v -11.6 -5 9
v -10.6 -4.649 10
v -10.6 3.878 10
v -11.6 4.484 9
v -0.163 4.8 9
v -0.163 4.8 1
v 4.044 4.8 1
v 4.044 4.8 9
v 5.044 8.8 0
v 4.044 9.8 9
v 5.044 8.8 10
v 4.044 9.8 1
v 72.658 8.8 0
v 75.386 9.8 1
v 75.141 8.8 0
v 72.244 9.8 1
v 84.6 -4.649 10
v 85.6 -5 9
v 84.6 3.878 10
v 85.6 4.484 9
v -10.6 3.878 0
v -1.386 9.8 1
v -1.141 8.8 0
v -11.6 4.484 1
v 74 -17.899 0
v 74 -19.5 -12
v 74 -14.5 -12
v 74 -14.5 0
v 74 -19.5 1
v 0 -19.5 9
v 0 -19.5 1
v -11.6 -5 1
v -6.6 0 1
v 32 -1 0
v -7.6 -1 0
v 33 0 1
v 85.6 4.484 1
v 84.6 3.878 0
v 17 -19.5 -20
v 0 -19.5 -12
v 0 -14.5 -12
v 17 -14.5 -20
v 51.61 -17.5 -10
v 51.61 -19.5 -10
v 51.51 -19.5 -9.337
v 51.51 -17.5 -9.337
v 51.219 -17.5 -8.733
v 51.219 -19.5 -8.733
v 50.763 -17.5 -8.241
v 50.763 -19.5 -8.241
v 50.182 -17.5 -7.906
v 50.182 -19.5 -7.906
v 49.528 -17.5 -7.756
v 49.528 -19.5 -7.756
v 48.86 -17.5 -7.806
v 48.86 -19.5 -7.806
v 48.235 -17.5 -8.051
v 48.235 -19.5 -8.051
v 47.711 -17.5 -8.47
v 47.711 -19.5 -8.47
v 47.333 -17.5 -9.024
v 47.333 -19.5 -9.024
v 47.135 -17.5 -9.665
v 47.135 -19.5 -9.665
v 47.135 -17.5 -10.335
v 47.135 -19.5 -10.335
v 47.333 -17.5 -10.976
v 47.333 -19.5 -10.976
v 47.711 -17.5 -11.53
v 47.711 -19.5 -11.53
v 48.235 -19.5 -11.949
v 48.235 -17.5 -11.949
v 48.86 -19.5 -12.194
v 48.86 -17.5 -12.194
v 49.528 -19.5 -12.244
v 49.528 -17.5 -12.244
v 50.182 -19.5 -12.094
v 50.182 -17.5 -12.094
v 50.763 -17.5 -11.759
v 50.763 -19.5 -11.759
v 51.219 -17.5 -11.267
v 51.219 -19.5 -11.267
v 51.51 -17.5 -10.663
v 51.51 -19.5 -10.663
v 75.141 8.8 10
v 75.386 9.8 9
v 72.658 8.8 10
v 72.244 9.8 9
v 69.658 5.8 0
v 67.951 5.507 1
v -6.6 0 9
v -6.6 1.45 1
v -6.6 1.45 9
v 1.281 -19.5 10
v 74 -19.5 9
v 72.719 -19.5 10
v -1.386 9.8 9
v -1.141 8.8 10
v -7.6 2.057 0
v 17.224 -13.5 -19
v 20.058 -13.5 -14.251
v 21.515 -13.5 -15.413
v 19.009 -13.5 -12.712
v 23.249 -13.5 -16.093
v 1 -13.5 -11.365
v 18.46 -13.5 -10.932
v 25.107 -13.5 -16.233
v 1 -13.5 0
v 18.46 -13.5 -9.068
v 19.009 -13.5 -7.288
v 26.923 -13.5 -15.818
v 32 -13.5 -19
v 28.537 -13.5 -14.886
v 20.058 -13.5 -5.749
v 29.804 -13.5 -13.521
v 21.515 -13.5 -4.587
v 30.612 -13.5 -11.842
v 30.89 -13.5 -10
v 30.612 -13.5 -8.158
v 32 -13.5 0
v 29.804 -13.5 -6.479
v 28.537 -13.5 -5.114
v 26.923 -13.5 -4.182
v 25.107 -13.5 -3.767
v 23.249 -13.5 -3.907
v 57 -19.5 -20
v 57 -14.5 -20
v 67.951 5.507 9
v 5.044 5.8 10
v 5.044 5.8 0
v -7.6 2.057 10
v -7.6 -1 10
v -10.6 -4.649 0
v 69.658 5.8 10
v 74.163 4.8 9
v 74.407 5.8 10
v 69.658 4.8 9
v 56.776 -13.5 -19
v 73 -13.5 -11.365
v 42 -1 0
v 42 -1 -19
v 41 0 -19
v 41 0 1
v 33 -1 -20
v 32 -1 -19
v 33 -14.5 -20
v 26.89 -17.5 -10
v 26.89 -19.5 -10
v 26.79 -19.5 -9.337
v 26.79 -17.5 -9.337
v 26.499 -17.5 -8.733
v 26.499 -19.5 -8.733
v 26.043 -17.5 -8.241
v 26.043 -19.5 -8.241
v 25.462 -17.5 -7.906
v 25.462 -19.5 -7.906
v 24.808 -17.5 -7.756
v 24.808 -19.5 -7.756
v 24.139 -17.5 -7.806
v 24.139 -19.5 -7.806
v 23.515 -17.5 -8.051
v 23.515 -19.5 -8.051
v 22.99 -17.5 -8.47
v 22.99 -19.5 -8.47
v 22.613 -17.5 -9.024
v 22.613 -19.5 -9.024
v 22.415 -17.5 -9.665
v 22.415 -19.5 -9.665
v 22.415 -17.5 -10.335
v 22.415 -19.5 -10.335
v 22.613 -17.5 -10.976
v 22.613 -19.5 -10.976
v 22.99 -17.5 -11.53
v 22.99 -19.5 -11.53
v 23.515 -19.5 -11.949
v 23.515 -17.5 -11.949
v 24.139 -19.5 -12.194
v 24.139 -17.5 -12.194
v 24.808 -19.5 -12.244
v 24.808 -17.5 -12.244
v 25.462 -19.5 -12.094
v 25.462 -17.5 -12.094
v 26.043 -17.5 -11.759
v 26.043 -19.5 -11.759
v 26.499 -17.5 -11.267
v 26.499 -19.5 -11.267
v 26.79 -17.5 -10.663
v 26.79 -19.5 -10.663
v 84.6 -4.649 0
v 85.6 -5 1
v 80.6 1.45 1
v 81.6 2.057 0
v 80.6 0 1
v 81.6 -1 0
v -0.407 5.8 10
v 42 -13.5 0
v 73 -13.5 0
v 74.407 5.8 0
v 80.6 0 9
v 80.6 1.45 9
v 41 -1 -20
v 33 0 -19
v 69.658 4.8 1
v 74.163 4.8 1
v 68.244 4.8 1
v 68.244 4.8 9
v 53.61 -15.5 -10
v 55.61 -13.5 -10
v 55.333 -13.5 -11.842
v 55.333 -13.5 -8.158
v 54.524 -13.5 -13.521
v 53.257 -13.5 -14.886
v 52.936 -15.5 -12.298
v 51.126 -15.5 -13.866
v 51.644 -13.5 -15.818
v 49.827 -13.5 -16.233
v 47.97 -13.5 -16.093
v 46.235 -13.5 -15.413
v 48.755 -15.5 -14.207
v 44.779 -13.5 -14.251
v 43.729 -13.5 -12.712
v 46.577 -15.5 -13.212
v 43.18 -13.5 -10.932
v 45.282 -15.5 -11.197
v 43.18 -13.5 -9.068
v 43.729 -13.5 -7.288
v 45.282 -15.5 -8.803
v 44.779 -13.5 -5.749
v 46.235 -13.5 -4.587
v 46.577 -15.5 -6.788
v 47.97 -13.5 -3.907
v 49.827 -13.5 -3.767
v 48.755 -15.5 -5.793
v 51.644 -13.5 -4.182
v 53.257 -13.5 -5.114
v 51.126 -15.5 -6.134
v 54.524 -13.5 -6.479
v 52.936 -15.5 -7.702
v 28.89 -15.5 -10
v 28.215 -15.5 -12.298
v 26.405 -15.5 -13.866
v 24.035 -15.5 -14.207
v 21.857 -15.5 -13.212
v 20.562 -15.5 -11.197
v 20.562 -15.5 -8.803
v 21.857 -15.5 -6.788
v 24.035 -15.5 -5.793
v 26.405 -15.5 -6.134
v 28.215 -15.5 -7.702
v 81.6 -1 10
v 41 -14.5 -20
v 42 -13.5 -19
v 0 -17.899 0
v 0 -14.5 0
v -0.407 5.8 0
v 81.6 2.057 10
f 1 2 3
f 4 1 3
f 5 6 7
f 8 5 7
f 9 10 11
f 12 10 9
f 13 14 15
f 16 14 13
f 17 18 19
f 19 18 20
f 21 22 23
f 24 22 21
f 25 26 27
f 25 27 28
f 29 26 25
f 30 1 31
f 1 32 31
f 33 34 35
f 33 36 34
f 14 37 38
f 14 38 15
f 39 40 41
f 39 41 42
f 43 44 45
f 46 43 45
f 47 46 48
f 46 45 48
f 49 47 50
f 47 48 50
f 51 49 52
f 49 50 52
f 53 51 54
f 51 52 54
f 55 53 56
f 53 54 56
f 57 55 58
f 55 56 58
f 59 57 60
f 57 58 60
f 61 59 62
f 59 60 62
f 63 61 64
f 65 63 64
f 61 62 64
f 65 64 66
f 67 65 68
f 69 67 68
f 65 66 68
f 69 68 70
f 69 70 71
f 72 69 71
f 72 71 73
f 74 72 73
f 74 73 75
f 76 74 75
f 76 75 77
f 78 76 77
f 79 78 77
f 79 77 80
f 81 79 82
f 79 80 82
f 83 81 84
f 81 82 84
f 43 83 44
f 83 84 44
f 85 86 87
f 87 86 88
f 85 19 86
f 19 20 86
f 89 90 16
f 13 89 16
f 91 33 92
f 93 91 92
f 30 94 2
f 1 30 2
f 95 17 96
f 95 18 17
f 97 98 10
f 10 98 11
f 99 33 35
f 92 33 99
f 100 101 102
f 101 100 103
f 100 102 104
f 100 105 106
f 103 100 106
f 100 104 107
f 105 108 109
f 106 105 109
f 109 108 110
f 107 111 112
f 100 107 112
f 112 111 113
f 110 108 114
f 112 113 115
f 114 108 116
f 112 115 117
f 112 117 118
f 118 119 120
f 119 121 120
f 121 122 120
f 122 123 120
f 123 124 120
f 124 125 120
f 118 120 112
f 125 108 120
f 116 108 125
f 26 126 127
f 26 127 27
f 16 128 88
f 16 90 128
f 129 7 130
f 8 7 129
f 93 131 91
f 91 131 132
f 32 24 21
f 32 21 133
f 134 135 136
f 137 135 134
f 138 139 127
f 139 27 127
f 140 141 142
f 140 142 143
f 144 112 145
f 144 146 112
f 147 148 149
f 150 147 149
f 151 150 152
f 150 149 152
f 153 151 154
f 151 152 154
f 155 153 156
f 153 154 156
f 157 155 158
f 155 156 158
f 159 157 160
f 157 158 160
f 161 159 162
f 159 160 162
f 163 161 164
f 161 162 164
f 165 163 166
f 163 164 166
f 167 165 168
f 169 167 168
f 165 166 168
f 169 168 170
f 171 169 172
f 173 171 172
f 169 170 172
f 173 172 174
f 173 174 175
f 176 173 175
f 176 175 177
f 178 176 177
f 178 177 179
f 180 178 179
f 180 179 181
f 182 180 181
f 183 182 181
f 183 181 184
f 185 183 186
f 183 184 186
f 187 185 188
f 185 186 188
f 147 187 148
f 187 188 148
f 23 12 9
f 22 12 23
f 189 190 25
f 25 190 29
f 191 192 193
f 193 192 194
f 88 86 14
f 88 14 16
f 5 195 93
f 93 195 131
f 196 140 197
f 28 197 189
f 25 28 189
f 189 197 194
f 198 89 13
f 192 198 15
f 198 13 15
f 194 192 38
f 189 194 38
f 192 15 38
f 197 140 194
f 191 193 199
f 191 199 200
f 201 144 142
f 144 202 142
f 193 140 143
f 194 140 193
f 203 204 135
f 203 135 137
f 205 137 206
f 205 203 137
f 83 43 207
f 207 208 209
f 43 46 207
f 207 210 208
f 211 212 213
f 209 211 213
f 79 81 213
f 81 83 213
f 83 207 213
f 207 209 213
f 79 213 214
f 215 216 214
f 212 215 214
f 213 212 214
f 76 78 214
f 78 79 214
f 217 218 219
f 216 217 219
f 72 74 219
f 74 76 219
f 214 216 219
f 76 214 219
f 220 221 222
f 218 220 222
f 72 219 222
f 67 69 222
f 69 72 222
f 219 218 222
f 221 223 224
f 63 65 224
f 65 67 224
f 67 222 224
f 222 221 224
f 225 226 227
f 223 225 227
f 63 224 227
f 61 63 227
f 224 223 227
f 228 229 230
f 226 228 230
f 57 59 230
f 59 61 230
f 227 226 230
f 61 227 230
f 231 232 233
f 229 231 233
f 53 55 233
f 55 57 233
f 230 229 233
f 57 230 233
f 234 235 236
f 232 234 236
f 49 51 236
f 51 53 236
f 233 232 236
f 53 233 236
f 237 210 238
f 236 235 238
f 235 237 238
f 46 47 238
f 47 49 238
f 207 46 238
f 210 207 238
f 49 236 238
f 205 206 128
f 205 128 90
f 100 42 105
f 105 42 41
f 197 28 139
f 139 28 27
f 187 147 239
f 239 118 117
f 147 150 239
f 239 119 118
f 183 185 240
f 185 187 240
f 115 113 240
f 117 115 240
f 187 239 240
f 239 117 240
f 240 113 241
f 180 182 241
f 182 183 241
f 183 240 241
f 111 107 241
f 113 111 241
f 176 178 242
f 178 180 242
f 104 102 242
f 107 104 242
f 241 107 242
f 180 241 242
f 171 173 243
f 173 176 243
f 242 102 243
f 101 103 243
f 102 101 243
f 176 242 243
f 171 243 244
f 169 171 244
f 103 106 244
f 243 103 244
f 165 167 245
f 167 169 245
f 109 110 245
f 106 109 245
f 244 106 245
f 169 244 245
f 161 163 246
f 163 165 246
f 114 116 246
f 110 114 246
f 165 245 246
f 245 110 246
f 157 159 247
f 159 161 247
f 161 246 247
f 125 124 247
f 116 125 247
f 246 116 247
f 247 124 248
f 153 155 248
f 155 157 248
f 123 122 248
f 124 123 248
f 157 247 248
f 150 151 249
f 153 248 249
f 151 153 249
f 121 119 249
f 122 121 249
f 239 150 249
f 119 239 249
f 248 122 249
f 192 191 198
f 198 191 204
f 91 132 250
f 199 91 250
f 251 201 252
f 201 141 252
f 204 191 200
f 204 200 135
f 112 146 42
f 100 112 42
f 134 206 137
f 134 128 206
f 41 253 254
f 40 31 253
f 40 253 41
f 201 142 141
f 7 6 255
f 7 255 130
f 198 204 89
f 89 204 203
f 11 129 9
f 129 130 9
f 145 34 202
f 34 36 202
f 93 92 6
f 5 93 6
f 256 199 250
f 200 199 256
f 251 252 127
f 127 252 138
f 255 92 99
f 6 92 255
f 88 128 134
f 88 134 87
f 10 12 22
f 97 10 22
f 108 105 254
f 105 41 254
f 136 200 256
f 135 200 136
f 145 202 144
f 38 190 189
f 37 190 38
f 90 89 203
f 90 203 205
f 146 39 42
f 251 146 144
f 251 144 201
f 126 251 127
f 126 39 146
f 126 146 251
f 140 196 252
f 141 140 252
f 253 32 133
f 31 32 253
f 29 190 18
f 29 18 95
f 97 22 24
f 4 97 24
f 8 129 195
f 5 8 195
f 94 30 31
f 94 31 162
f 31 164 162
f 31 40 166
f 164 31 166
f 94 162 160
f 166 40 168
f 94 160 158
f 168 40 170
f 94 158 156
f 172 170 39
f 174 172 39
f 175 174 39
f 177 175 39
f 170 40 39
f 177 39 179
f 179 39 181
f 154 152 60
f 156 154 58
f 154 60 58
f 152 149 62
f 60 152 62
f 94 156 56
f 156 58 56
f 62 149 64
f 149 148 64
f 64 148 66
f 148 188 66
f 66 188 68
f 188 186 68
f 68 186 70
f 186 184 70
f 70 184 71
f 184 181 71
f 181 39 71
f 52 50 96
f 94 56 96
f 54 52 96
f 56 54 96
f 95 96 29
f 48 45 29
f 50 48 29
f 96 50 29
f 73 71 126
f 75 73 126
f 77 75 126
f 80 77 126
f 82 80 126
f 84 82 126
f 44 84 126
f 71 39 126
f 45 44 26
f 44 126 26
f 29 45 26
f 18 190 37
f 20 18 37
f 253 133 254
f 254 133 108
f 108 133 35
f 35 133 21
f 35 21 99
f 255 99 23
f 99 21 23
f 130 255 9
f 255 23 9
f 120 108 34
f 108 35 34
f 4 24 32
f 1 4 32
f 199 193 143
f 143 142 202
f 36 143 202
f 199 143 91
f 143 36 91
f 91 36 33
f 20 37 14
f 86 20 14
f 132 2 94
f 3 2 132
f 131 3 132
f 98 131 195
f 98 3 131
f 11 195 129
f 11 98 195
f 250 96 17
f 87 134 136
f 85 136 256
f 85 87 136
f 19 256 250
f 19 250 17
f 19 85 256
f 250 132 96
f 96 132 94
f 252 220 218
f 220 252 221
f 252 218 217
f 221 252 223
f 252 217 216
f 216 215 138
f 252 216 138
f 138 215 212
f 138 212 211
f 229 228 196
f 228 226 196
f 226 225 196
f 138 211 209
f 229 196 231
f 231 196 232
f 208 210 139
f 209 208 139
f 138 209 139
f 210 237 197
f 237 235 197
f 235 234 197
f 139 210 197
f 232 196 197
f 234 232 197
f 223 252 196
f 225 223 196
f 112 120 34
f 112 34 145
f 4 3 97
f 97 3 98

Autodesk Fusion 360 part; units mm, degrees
sketch "saddle profile" plane through (0, 0, 0) normal (0, 0, 1) x (1, 0, 0) in component "hook"
  line L0 (0, 0) -> (0, 1.45)
  line L1 (0, 1.45) -> (4.9, 4)
  line L2 (4.9, 4) -> (11.5, 4)
  line L3 (11.5, 4) -> (11.5, 8)
  line L4 (11.5, 8) -> (37, 8)
  line L5 (37, 0) -> (0, 0)
  line L6 (37, 8) -> (37, 0) construction
  line L7 (74, 0) -> (74, 1.45)
  line L8 (74, 1.45) -> (69.1, 4)
  line L9 (69.1, 4) -> (62.5, 4)
  line L10 (62.5, 4) -> (62.5, 8)
  line L11 (62.5, 8) -> (37, 8)
  line L12 (37, 0) -> (74, 0)
  line L13 (0, 0) -> (0, -19.5) construction
  line L14 (0, -19.5) -> (74, -19.5) construction
  line L15 (74, -19.5) -> (74, 0) construction
  dimension "d7" = 1.45
  dimension "d8" = 6.6
  dimension "d9" = 4
  dimension "d10" = 11.5
  dimension "d11" = 4
  dimension "d12" = 37
  dimension "d13" = 19.5
sketch "mount profile" plane through (0, 0, 0) normal (0, 0, 1) x (1, 0, 0) in component "hook"
  line L0 (-11.6, 4.4845) -> (-11.6, -5)
  line L1 (0, -19.5) -> (74, -19.5)
  line L2 (-6.6, 1.45) -> (-0.1627, 4.8)
  line L3 (5.0442, 9.8) -> (-1.3859, 9.8)
  line L4 (-1.3859, 9.8) -> (-11.6, 4.4845)
  line L5 (-0.1627, 4.8) -> (5.0442, 4.8)
  line L6 (5.0442, 4.8) -> (5.0442, 9.8)
  line L7 (0, 1.45) -> (4.9, 4)
  line L8 (75.3859, 9.8) -> (72.2442, 9.8)
  line L9 (74.1627, 4.8) -> (67.2442, 4.8)
  line L10 (67.2442, 4.8) -> (72.2442, 9.8)
  line L11 (85.6, -5) -> (85.6, 4.4845)
  line L12 (80.6, 0) -> (-6.6, 0)
  line L13 (-6.6, 0) -> (-6.6, 1.45)
  line L14 (80.6, 0) -> (80.6, 1.45)
  line L15 (80.6, 1.45) -> (74.1627, 4.8)
  line L16 (-3.3814, 3.125) -> (-5.6896, 7.5603) construction
  line L17 (85.6, 4.4845) -> (75.3859, 9.8)
  line L18 (77.3814, 3.125) -> (79.6896, 7.5603) construction
  line L19 (85.6, 0.725) -> (80.6, 0.725) construction
  line L20 (-6.6, 0.725) -> (-11.6, 0.725) construction
  line L21 (85.6, -5) -> (74, -19.5)
  line L22 (-11.6, -5) -> (0, -19.5)
  line L23 (85.6, -5) -> (-11.6, -5) construction
  line L24 (37, 0) -> (37, -5) construction
  line L25 (74, -19.5) -> (74, -13.5)
  line L26 (74, -13.5) -> (0, -13.5)
  line L27 (0, -13.5) -> (0, -19.5)
  point P0 (74, 0)
  point P1 (74, -19.5)
  point P2 (0, -19.5)
  dimension "d16" = 74
  dimension "d17" = 1.45
  dimension "d19" = 4.8
  dimension "d20" = 62.2
  dimension "d22" = 6.6
  dimension "d23" = 45
  dimension "d24" = 6.6
  dimension "d25" = 5
  dimension "d26" = 19.5
  dimension "d29" = 6
  dimension "d47" = 5.2069
extrude "Extrude2" add sketch "mount profile" along normal blind 10 in component "hook"
sketch "mount" plane through (0, -19.5, 0) normal (0, -1, 0) x (1, 0, 0) in component "hook"
  line L0 (0, 0) -> (74, 0)
  line L1 (74, 0) -> (74, 10)
  line L2 (74, 10) -> (0, 10)
  line L3 (0, 10) -> (0, 0)
  line L4 (0, 0) -> (0, -12)
  line L5 (0, -12) -> (17, -20)
  line L6 (17, -20) -> (57, -20)
  line L7 (57, -20) -> (74, -12)
  line L8 (74, -12) -> (74, 0)
  circle A0 centre (24.6397, -10) radius 6.25 construction
  circle A1 centre (49.3603, -10) radius 6.25 construction
  circle A2 centre (24.6397, -10) radius 2.25
  circle A3 centre (49.3603, -10) radius 2.25
  line L9 (24.6397, -10) -> (49.3603, -10) construction
  line L10 (24.6397, -10) -> (0, -12) construction
  line L11 (49.3603, -10) -> (74, -12) construction
  line L12 (42, 0) -> (42, -20)
  line L13 (32, 0) -> (32, -20)
  line L14 (42, -3.75) -> (74, -3.75) construction
  line L15 (32, -3.75) -> (0, -3.75) construction
  dimension "d33" = 12.5
  dimension "d34" = 4.5
  dimension "d35" = 12
  dimension "d36" = 40
  dimension "d37" = 8
  dimension "d40" = 10
  dimension "d42" = 10
extrude "Extrude3" add sketch "mount" against normal blind 6 contours L0 L4 L5 L6 L13 | L0 L6 L12 L13 | L0 L6 L7 L8 L12 in component "hook"
extrude "Extrude4" add sketch "mount" against normal up to surface (13.5 mm away) from surface at -6 contours L0 L6 L12 L13 in component "hook"
chamfer "Chamfer1" distance 4 angle 45 2 edges at (47.2626, -13.5, -10.8136) (22.5419, -13.5, -10.8136) in component "hook"
chamfer "Chamfer2" distance 1 angle 45 47 edges at (74, -13.5, -6) (65.5, -13.5, -16) (49.5, -13.5, -20) (8.5, -13.5, -16) (24.5, -13.5, -20) (0, -13.5, -6) (42, 0, -10) (61.3, 0, 0) (12.7, 0, 0) (32, 0, -10) (37, 0, -20) (42, -6.75, -20) (32, -6.75, -20) (79.8, -12.25, 0) (79.8, -12.25, 10) (85.6, -0.2577, 10) (85.6, -0.2577, 0) (-5.8, -12.25, 0) (-5.8, -12.25, 10) (-11.6, -0.2577, 10) (-11.6, -0.2577, 0) (-6.493, 7.1423, 10) (-6.493, 7.1423, 0) (1.8291, 9.8, 0) (1.8291, 9.8, 10) (5.0442, 9.8, 5) (80.493, 7.1423, 0) (80.493, 7.1423, 10) (73.815, 9.8, 10) (73.815, 9.8, 0) (69.7442, 7.3, 10) (69.7442, 7.3, 0) (5.0442, 4.8, 5) (77.3814, 3.125, 0) (70.7035, 4.8, 0) (80.6, 0.725, 0) (2.4407, 4.8, 0) (-3.3814, 3.125, 0) (-6.6, 0.725, 0) (67.2442, 4.8, 5) (77.3814, 3.125, 10) (37, 0, 10) (80.6, 0.725, 10) (70.7035, 4.8, 10) (2.4407, 4.8, 10) (-3.3814, 3.125, 10) (-6.6, 0.725, 10) in component "hook"
component "hook" placed x (1, 0, 0) y (0, 1, 0) z (0, 0, 1) at (0, 0, 0)
equation "saddleW = 74 mm"
equation "saddleShelfD = 19.5 mm"
equation "saddleLipD = 11.5 mm"
equation "saddleLipT = 4 mm"
equation "saddleLipFlat = 6.6 mm"
equation "saddleEdgeH = 1.45 mm"
equation "d7 = saddleEdgeH"
equation "d8 = saddleLipFlat"
equation "d9 = saddleLipT"
equation "d10 = saddleLipD"
equation "d11 = d9"
equation "d12 = saddleW / 2"
equation "d13 = saddleShelfD"
equation "d16 = saddleW"
equation "d17 = saddleEdgeH"
equation "d19 = saddleLipT * 1.2"
equation "d20 = saddleW - ( 2 * saddleLipD ) + saddleLipFlat + 4.6 mm"
equation "d22 = saddleLipFlat"
equation "d24 = d22"
equation "d26 = saddleShelfD"
equation "mountT = 10 mm"
equation "d31 = mountT"
equation "d42 = mountT"
